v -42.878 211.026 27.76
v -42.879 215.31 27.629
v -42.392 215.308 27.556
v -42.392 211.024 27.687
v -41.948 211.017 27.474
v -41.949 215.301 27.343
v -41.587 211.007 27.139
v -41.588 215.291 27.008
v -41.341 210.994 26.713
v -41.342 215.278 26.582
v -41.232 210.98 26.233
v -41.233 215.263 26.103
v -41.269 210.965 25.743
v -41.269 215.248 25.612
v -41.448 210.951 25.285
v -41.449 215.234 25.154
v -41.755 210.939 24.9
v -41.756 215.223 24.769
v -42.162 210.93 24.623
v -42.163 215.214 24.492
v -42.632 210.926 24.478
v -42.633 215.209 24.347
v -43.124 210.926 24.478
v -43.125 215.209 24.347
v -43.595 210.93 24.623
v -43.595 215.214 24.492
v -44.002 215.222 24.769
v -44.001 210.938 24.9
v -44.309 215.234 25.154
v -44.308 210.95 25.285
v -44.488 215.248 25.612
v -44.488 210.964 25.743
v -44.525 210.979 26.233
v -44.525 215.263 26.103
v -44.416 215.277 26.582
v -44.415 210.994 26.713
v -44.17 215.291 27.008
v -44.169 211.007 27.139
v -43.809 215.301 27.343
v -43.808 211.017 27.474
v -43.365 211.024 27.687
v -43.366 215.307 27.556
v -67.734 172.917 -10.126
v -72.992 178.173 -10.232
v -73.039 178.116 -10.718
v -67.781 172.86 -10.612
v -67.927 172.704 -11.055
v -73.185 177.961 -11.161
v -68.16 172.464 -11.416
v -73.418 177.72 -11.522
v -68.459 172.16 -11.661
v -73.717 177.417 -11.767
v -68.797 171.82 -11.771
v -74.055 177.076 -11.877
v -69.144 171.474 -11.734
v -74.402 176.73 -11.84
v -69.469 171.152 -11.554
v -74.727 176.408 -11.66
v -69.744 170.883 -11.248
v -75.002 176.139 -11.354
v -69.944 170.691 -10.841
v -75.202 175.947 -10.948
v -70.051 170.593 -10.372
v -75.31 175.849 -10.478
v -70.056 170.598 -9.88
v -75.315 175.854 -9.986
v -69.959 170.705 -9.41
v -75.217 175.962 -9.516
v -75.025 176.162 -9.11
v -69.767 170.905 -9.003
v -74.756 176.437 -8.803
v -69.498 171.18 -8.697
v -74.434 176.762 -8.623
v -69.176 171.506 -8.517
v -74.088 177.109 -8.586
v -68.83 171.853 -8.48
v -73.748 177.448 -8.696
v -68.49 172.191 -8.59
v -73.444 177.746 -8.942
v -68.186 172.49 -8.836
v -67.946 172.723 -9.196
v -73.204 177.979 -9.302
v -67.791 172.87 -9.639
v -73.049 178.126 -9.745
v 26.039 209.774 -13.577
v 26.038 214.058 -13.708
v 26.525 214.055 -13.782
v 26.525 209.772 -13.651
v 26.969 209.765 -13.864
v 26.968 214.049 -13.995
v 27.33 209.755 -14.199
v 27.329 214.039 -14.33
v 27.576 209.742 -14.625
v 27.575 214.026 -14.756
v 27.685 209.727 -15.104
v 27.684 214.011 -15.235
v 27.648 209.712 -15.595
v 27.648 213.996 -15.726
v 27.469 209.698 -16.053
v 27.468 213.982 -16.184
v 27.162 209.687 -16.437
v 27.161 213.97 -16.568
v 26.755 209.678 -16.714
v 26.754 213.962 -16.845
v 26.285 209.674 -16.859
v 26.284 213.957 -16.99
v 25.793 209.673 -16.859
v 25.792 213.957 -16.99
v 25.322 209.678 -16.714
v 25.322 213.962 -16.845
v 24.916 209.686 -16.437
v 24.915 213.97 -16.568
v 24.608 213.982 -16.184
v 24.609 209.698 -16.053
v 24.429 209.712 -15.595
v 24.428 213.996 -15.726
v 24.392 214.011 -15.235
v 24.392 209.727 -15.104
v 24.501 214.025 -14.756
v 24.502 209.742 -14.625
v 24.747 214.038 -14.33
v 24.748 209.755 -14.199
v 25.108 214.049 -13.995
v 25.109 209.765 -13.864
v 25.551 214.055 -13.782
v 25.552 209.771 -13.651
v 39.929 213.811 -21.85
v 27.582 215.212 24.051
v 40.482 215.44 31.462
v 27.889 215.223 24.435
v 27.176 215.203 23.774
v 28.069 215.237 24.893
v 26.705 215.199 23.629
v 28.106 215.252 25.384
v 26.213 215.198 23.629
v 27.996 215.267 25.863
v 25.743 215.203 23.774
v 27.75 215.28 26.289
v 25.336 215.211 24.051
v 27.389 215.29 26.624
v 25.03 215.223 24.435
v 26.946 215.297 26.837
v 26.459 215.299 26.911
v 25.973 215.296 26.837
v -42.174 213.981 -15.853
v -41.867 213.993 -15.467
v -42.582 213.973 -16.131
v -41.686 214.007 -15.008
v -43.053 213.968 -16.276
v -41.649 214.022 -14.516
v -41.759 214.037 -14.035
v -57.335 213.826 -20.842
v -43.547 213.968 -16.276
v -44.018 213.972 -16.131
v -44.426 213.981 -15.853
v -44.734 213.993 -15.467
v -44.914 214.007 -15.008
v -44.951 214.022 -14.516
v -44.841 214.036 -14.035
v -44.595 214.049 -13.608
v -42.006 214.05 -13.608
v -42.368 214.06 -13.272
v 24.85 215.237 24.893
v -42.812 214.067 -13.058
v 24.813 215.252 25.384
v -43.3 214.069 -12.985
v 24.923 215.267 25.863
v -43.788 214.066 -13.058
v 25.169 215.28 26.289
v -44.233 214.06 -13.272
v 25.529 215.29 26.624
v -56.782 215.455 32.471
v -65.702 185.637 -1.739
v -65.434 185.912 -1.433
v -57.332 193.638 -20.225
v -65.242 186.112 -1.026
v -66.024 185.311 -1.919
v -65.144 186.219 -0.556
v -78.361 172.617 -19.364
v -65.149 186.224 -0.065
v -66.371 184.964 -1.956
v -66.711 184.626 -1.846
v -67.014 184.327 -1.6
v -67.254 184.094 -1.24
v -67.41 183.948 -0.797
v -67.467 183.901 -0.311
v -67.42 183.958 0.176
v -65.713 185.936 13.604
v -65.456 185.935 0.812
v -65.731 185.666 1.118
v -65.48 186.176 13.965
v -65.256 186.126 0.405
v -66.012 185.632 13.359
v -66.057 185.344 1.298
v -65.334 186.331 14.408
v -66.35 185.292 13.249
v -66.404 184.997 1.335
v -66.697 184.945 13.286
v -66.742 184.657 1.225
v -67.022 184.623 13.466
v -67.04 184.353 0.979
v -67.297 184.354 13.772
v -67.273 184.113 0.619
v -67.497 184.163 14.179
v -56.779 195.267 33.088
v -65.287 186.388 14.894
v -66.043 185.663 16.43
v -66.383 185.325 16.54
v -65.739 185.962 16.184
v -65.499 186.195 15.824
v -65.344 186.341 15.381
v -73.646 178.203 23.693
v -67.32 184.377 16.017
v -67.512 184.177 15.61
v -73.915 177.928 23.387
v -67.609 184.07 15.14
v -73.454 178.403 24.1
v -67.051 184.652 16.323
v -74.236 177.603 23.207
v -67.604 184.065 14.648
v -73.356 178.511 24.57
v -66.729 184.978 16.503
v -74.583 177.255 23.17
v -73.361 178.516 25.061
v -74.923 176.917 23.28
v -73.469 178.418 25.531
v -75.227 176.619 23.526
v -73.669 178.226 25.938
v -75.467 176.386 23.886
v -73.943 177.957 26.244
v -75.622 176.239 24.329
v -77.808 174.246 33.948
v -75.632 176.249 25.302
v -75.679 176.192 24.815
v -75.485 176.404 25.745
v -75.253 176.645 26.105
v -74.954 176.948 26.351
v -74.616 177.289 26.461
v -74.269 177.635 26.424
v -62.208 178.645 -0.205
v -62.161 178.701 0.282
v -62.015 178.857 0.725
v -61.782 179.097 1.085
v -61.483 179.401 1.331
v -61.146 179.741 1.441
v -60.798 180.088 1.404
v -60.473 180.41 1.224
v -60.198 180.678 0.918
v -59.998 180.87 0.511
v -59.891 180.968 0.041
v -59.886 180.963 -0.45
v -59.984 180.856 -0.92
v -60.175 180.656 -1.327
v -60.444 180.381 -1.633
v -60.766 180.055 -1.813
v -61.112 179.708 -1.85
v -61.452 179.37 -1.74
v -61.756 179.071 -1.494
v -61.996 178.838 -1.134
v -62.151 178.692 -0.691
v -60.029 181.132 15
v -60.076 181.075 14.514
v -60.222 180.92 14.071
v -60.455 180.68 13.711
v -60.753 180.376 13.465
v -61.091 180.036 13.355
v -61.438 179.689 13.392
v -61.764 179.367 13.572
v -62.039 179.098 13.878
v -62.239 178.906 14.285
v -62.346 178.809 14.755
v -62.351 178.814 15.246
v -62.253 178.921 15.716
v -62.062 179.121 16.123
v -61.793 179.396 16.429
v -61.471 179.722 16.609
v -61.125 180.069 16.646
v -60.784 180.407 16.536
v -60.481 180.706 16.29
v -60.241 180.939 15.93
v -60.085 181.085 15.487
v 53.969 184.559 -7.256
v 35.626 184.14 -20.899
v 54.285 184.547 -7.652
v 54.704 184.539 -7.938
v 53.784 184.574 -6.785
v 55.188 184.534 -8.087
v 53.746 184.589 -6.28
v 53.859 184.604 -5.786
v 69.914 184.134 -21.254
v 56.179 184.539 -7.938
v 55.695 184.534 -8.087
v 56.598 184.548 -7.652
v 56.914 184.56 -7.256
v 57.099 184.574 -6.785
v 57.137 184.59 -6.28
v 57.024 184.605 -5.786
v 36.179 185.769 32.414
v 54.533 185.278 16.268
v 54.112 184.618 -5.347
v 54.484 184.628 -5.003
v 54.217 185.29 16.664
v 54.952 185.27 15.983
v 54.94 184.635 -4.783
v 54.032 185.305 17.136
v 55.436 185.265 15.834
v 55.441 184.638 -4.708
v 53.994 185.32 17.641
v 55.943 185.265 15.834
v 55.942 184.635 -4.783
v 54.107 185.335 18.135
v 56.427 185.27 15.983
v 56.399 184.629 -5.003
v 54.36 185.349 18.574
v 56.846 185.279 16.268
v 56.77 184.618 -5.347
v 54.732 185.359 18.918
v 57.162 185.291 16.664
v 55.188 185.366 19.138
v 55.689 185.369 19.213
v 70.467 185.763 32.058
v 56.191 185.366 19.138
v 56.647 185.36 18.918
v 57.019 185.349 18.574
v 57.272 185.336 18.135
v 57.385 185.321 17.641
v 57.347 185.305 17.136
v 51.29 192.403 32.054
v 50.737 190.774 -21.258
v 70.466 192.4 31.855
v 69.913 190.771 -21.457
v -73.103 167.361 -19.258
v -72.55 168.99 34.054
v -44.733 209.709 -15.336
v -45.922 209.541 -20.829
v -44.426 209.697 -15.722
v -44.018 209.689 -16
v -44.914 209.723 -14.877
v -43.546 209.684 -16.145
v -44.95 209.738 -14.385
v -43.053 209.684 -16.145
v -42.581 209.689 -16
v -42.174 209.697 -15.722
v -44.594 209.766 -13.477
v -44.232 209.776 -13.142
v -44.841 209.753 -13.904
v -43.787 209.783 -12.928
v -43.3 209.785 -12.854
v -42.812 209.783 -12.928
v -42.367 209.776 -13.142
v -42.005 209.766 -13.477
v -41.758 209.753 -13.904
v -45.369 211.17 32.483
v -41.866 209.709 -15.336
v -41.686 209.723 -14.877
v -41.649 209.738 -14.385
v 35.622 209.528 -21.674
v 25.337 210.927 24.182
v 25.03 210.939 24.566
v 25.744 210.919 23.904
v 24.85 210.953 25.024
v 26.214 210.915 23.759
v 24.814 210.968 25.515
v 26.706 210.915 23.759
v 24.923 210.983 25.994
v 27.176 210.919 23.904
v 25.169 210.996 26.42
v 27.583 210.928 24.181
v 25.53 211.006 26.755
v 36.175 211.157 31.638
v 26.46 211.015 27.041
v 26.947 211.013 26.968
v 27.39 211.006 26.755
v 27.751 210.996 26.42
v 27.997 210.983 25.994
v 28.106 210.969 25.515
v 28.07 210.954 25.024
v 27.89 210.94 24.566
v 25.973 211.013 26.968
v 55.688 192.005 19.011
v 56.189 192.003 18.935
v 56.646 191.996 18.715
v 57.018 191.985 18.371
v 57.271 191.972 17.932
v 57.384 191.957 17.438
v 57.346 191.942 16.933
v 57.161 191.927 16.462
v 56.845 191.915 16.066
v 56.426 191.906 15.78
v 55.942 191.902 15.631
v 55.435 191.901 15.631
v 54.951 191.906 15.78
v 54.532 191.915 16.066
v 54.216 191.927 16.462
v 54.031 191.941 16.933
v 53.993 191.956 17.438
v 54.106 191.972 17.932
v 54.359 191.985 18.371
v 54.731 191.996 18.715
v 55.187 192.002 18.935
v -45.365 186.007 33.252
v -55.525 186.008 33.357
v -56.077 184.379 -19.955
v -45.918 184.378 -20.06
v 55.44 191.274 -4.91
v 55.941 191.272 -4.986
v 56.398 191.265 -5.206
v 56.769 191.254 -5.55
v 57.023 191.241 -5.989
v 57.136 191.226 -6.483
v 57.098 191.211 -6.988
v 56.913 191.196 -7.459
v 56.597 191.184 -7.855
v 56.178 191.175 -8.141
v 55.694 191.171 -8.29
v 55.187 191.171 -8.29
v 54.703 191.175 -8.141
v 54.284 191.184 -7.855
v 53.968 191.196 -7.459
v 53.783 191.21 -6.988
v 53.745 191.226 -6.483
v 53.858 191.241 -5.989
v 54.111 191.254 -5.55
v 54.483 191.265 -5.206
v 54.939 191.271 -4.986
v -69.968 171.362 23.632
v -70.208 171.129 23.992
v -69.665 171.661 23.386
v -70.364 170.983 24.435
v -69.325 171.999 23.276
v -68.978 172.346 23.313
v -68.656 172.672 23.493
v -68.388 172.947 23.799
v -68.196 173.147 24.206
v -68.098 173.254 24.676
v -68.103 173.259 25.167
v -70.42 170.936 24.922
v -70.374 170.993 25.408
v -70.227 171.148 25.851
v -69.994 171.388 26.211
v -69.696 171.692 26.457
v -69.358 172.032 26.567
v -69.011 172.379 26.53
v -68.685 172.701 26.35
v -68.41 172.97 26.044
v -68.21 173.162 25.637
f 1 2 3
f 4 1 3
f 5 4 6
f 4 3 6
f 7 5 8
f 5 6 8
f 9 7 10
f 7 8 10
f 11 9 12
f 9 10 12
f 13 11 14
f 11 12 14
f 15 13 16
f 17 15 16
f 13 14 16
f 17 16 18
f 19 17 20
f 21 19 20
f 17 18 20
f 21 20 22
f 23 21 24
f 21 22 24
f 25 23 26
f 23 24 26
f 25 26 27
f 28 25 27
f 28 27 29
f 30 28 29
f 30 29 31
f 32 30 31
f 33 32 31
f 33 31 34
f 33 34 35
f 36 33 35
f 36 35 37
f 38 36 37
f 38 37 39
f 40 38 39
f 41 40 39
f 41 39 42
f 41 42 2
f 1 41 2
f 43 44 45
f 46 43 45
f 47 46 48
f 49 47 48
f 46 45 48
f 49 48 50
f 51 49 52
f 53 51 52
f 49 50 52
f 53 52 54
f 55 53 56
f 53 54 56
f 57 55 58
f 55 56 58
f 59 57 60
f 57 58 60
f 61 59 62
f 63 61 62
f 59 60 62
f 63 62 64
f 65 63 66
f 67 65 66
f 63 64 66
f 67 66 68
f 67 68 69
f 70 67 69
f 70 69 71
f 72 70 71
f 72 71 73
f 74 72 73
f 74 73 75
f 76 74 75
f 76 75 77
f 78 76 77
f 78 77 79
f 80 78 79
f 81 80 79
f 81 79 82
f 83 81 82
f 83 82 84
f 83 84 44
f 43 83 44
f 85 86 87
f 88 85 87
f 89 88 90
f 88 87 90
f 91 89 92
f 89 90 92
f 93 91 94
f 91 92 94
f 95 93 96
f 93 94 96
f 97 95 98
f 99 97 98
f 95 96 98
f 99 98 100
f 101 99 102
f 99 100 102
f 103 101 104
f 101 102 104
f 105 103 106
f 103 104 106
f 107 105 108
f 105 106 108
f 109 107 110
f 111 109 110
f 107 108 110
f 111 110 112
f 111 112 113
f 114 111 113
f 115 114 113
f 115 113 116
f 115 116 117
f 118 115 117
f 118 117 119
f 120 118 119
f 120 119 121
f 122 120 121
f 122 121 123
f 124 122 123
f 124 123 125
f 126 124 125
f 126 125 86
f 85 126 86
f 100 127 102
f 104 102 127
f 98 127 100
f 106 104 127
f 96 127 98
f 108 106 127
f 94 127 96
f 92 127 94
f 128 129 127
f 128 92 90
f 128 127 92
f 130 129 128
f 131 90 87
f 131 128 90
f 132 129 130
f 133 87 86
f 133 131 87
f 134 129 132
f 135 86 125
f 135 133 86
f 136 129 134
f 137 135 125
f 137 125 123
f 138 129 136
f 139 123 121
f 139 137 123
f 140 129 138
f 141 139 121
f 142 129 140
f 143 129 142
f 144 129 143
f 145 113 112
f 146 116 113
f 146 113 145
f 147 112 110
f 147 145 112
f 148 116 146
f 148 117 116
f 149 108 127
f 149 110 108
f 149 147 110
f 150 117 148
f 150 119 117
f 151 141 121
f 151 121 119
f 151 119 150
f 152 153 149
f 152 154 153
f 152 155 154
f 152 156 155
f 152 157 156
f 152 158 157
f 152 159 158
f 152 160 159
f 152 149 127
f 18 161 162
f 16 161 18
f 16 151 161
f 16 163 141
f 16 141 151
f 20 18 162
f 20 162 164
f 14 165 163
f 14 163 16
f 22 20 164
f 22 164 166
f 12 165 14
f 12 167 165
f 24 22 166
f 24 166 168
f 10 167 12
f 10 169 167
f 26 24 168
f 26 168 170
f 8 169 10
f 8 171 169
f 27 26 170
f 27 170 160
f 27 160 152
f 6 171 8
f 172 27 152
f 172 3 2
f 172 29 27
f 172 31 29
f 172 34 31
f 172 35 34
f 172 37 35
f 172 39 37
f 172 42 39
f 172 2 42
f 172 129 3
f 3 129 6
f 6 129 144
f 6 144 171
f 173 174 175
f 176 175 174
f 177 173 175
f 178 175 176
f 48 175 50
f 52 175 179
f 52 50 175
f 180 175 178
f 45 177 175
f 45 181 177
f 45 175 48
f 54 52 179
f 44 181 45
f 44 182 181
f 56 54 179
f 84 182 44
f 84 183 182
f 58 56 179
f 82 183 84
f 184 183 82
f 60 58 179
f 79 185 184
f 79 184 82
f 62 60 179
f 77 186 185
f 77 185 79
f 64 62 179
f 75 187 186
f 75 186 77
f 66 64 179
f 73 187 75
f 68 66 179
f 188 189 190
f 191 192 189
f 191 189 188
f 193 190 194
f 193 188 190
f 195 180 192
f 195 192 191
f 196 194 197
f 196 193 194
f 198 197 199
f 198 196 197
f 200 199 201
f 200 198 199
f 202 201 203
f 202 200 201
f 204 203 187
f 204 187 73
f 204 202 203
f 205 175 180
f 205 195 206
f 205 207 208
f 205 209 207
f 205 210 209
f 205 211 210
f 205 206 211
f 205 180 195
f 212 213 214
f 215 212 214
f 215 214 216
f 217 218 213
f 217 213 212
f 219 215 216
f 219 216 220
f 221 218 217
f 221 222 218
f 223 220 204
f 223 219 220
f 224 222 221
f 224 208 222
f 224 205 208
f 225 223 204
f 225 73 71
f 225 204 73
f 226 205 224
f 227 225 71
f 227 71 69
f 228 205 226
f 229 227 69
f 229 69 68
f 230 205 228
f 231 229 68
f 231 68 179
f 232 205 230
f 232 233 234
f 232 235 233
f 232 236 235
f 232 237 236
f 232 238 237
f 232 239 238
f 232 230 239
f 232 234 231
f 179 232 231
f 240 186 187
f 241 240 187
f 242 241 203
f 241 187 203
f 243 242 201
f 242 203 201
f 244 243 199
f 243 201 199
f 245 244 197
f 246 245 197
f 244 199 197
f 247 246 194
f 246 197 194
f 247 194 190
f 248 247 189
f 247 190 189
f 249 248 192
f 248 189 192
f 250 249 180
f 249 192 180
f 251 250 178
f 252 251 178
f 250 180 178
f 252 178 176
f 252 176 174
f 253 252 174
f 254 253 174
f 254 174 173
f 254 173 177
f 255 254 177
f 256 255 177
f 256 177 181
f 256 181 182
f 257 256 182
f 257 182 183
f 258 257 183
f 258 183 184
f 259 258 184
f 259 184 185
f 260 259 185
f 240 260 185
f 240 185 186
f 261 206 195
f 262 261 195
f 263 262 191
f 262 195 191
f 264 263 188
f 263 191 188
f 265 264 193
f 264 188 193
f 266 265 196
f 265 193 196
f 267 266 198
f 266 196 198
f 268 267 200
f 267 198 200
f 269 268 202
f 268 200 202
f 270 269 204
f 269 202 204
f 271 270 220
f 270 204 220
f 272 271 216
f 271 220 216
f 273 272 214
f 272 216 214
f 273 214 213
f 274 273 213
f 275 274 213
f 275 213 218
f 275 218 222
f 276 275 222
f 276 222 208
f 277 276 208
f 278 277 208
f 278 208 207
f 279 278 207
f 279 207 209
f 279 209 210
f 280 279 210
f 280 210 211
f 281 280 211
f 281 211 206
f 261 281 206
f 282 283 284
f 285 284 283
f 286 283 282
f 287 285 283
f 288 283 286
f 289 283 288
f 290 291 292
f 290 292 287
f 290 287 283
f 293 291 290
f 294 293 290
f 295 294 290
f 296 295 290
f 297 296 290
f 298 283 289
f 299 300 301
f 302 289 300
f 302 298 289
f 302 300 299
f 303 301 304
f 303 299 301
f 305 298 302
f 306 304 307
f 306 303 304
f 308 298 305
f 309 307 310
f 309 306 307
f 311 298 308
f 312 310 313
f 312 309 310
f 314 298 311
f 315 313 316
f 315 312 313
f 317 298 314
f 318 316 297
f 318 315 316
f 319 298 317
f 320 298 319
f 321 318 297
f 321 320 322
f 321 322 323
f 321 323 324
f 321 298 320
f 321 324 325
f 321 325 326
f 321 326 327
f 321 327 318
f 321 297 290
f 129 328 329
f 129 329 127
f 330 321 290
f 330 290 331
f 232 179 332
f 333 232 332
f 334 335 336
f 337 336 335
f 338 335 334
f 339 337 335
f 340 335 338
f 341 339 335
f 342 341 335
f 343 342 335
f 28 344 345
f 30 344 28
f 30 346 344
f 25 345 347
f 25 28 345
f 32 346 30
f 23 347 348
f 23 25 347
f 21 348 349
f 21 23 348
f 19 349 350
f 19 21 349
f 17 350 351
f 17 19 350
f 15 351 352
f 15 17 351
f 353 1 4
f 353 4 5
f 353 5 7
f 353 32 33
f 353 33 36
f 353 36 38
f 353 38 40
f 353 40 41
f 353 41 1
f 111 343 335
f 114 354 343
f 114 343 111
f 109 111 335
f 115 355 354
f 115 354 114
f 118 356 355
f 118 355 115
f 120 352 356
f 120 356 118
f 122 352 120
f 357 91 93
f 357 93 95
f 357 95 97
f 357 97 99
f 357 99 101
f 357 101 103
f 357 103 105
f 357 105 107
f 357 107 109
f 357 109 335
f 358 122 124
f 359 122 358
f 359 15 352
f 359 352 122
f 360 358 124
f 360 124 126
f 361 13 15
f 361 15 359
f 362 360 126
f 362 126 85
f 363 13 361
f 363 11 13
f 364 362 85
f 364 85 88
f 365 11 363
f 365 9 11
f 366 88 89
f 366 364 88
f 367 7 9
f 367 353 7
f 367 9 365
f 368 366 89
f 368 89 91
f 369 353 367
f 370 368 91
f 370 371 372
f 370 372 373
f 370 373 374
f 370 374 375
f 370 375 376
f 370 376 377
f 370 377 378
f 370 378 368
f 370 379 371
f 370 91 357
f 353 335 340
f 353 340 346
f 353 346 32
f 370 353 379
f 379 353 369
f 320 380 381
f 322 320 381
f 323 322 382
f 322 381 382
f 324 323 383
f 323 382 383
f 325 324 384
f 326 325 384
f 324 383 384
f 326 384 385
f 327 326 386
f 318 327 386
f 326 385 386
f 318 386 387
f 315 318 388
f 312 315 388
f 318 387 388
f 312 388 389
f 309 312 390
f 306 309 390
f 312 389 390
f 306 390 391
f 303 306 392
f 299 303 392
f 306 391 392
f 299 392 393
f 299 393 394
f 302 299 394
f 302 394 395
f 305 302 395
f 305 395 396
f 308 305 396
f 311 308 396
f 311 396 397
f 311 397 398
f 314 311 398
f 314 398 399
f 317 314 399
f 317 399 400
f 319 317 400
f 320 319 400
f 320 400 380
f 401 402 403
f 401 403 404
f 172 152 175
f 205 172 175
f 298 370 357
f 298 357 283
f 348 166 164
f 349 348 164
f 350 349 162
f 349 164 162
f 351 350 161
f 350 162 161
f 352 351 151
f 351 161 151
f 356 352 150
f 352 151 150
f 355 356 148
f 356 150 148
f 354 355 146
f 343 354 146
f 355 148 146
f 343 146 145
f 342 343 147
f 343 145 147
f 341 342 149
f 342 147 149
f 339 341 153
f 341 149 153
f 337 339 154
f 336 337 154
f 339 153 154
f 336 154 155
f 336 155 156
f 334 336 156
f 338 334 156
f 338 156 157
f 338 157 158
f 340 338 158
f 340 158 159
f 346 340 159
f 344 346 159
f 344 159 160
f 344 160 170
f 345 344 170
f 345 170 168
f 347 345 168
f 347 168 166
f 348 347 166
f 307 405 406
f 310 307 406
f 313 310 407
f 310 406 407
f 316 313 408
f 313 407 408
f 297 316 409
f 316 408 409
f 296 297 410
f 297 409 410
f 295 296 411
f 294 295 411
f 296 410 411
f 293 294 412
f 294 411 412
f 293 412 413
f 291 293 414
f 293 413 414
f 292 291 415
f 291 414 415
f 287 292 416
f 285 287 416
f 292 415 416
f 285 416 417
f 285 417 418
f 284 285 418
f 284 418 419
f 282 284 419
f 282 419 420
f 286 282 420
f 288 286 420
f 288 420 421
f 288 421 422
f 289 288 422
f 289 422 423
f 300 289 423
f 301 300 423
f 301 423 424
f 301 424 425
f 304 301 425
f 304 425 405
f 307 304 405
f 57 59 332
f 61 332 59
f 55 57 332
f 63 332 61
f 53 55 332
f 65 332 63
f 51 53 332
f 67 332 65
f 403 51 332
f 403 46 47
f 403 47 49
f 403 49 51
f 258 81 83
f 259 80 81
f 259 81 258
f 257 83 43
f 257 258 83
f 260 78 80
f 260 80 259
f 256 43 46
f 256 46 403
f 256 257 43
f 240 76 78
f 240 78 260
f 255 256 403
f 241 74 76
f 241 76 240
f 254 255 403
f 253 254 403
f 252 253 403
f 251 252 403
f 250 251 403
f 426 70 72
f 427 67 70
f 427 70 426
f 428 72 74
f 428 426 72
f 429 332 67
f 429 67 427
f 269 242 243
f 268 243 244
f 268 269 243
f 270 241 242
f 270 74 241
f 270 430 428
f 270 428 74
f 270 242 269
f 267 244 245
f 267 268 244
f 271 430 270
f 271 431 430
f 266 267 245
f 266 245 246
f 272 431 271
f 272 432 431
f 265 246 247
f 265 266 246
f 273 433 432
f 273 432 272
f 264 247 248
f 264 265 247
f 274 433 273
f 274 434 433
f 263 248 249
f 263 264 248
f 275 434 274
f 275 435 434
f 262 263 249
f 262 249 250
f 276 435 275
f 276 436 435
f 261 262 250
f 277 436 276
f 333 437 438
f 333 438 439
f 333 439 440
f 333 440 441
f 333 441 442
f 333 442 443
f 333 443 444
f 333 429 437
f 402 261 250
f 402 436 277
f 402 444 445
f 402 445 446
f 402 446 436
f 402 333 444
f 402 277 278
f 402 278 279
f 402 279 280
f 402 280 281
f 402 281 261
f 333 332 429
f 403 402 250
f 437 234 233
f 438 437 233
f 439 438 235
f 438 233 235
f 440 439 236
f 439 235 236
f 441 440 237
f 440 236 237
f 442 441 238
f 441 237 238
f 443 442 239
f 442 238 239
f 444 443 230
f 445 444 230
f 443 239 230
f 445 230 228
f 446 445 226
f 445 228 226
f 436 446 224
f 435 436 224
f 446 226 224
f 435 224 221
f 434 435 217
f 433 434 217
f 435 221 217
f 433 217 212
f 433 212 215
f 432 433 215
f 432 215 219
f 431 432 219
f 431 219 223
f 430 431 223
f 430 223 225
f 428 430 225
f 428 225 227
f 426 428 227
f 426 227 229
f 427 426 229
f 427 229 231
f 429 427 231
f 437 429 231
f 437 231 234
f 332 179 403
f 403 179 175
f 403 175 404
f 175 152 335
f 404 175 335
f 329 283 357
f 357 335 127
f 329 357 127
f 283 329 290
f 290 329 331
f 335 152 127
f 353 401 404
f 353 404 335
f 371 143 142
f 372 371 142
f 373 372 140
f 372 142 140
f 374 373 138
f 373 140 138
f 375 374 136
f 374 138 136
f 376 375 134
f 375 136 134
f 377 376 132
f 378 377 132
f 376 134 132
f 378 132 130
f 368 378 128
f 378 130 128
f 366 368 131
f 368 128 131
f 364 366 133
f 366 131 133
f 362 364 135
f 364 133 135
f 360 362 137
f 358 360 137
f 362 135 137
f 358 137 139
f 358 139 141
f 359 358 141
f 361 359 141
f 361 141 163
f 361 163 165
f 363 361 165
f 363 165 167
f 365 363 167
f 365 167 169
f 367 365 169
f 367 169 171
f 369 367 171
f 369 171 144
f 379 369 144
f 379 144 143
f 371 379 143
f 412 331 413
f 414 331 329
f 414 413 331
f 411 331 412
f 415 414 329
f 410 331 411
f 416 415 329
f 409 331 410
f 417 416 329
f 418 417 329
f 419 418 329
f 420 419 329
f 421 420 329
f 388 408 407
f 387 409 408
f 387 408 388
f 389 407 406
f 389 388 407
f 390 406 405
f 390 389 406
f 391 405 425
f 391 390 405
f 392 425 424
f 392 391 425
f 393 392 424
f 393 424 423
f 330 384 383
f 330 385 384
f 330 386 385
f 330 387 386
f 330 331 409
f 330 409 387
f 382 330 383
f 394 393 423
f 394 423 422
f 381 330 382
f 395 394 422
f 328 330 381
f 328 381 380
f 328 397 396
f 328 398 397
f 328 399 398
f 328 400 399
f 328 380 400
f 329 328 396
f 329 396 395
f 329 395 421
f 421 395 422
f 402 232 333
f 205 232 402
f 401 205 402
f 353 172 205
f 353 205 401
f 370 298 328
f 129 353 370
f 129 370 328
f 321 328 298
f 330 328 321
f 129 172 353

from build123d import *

# Parameters (mm, degrees)
BOSS_EXTRUDE2_DEPTH = 53.34
SKETCH4_R           = 1.7
CUT_EXTRUDE1_DEPTH  = 92.181462139
SKETCH5_R           = 1.65
CUT_EXTRUDE2_DEPTH  = 219.815917306
CUT_EXTRUDE3_REACH  = 101.921
SKETCH6_R           = 1.65548177
SKETCH6_R_2         = 1.651


with BuildPart() as part:
    # Sketch3 → Boss-Extrude2 (new body)
    with BuildSketch(Plane(origin=(0.39856693, 1.174139675, 38.425283804), x_dir=(0.9999462474151822, -0.00015834992252811985, -0.010367121374682776), z_dir=(0.010367121374682774, 0.030540538135663202, 0.999479763839562))):
        Polygon((35.811663947, 184.686461522), (70.101663947, 184.686461522), (70.101663947, 191.325794663), (50.92397302, 191.325794663), (40.119315635, 214.372267387), (-57.15, 214.372267387), (-57.15, 194.173966846), (-78.183444815, 173.140522031), (-72.925707516, 167.882784732), (-55.896794471, 184.911697776), (-45.736794471, 184.911697776), (-45.736794471, 210.086461522), (35.811663947, 210.086461522), align=None)
    extrude(amount=-BOSS_EXTRUDE2_DEPTH)

    # Sketch4 → Cut-Extrude1 (cut, through all)
    with BuildSketch(Plane(origin=(-0.030296425, 191.236544322, -5.843192728), x_dir=(0.999999987462651, 0.00015827605687458352, -4.836091908386067e-06), z_dir=(-0.0001583499225282815, 0.99953351642438, -0.030540538135663205))):
        with Locations(Location((55.718705533, -23.165573574, 0), (0, 0, 270))):
            Circle(SKETCH4_R)
        with Locations(Location((55.470585341, 0.766513873, 0), (0, 0, 270))):
            Circle(SKETCH4_R)
    extrude(amount=-CUT_EXTRUDE1_DEPTH, mode=Mode.SUBTRACT)

    # Sketch5 → Cut-Extrude2 (cut, through all)
    with BuildSketch(Plane(origin=(-125.675127332, 125.623262737, -2.535031563), x_dir=(-0.010088789926051056, 0.010084626405281995, 0.9998982531378351), z_dir=(-0.7071807426733389, 0.7068888977909322, -0.014264759791391517))):
        with Locations(Location((27.353288467, 72.760478035, 0), (0, 0, 270))):
            Circle(SKETCH5_R)
        with Locations(Location((17.431171, 84.018164474, 0), (0, 0, 90))):
            Circle(SKETCH5_R)
        with Locations(Location((2.224674143, 84.018164474, 0), (0, 0, 270))):
            Circle(SKETCH5_R)
        with Locations(Location((-7.697443324, 72.760478035, 0), (0, 0, 90))):
            Circle(SKETCH5_R)
    extrude(amount=-CUT_EXTRUDE2_DEPTH, mode=Mode.SUBTRACT)

    # Sketch6 → Cut-Extrude3 (cut, up to next)
    with BuildSketch(Plane(origin=(-0.033945832, 214.272266245, -6.547044407), x_dir=(0.999999987462651, 0.00015827605687420668, -4.836091908374553e-06), z_dir=(-0.00015834992252790448, 0.99953351642438, -0.030540538135663216)), mode=Mode.PRIVATE) as cut_extrude3_sk1:
        with Locations(Location((-43.266263609, 8.096604069, 0), (0, 0, 270))):
            Circle(SKETCH6_R)
    cut_extrude3_tool1 = extrude(cut_extrude3_sk1.sketch, amount=-CUT_EXTRUDE3_REACH, mode=Mode.PRIVATE) & part.part
    # Sketch6 → Cut-Extrude3 (cut, up to next)
    with BuildSketch(Plane(origin=(-0.033945832, 214.272266245, -6.547044407), x_dir=(0.999999987462651, 0.00015827605687420668, -4.836091908374553e-06), z_dir=(-0.00015834992252790448, 0.99953351642438, -0.030540538135663216)), mode=Mode.PRIVATE) as cut_extrude3_sk2:
        with Locations(Location((26.072009948, 8.815481008, 0), (0, 0, 270))):
            Circle(SKETCH6_R_2)
    cut_extrude3_tool2 = extrude(cut_extrude3_sk2.sketch, amount=-CUT_EXTRUDE3_REACH, mode=Mode.PRIVATE) & part.part
    # Sketch6 → Cut-Extrude3 (cut, up to next)
    with BuildSketch(Plane(origin=(-0.033945832, 214.272266245, -6.547044407), x_dir=(0.999999987462651, 0.00015827605687420668, -4.836091908374553e-06), z_dir=(-0.00015834992252790448, 0.99953351642438, -0.030540538135663216)), mode=Mode.PRIVATE) as cut_extrude3_sk3:
        with Locations(Location((26.493329766, -31.822334996, 0), (0, 0, 270))):
            Circle(SKETCH6_R_2)
    cut_extrude3_tool3 = extrude(cut_extrude3_sk3.sketch, amount=-CUT_EXTRUDE3_REACH, mode=Mode.PRIVATE) & part.part
    # Sketch6 → Cut-Extrude3 (cut, up to next)
    with BuildSketch(Plane(origin=(-0.033945832, 214.272266245, -6.547044407), x_dir=(0.999999987462651, 0.00015827605687420668, -4.836091908374553e-06), z_dir=(-0.00015834992252790448, 0.99953351642438, -0.030540538135663216)), mode=Mode.PRIVATE) as cut_extrude3_sk4:
        with Locations(Location((-42.844943791, -32.541211936, 0), (0, 0, 270))):
            Circle(SKETCH6_R_2)
    cut_extrude3_tool4 = extrude(cut_extrude3_sk4.sketch, amount=-CUT_EXTRUDE3_REACH, mode=Mode.PRIVATE) & part.part
    add(cut_extrude3_tool1.solids().sort_by_distance((-43.300209, 214.018144, -14.639662))[0], mode=Mode.SUBTRACT)
    add(cut_extrude3_tool2.solids().sort_by_distance((26.038064, 214.007163, -15.358539))[0], mode=Mode.SUBTRACT)
    add(cut_extrude3_tool3.solids().sort_by_distance((26.459384, 215.248331, 25.260318))[0], mode=Mode.SUBTRACT)
    add(cut_extrude3_tool4.solids().sort_by_distance((-42.878889, 215.259311, 25.979195))[0], mode=Mode.SUBTRACT)


solid = part.part
